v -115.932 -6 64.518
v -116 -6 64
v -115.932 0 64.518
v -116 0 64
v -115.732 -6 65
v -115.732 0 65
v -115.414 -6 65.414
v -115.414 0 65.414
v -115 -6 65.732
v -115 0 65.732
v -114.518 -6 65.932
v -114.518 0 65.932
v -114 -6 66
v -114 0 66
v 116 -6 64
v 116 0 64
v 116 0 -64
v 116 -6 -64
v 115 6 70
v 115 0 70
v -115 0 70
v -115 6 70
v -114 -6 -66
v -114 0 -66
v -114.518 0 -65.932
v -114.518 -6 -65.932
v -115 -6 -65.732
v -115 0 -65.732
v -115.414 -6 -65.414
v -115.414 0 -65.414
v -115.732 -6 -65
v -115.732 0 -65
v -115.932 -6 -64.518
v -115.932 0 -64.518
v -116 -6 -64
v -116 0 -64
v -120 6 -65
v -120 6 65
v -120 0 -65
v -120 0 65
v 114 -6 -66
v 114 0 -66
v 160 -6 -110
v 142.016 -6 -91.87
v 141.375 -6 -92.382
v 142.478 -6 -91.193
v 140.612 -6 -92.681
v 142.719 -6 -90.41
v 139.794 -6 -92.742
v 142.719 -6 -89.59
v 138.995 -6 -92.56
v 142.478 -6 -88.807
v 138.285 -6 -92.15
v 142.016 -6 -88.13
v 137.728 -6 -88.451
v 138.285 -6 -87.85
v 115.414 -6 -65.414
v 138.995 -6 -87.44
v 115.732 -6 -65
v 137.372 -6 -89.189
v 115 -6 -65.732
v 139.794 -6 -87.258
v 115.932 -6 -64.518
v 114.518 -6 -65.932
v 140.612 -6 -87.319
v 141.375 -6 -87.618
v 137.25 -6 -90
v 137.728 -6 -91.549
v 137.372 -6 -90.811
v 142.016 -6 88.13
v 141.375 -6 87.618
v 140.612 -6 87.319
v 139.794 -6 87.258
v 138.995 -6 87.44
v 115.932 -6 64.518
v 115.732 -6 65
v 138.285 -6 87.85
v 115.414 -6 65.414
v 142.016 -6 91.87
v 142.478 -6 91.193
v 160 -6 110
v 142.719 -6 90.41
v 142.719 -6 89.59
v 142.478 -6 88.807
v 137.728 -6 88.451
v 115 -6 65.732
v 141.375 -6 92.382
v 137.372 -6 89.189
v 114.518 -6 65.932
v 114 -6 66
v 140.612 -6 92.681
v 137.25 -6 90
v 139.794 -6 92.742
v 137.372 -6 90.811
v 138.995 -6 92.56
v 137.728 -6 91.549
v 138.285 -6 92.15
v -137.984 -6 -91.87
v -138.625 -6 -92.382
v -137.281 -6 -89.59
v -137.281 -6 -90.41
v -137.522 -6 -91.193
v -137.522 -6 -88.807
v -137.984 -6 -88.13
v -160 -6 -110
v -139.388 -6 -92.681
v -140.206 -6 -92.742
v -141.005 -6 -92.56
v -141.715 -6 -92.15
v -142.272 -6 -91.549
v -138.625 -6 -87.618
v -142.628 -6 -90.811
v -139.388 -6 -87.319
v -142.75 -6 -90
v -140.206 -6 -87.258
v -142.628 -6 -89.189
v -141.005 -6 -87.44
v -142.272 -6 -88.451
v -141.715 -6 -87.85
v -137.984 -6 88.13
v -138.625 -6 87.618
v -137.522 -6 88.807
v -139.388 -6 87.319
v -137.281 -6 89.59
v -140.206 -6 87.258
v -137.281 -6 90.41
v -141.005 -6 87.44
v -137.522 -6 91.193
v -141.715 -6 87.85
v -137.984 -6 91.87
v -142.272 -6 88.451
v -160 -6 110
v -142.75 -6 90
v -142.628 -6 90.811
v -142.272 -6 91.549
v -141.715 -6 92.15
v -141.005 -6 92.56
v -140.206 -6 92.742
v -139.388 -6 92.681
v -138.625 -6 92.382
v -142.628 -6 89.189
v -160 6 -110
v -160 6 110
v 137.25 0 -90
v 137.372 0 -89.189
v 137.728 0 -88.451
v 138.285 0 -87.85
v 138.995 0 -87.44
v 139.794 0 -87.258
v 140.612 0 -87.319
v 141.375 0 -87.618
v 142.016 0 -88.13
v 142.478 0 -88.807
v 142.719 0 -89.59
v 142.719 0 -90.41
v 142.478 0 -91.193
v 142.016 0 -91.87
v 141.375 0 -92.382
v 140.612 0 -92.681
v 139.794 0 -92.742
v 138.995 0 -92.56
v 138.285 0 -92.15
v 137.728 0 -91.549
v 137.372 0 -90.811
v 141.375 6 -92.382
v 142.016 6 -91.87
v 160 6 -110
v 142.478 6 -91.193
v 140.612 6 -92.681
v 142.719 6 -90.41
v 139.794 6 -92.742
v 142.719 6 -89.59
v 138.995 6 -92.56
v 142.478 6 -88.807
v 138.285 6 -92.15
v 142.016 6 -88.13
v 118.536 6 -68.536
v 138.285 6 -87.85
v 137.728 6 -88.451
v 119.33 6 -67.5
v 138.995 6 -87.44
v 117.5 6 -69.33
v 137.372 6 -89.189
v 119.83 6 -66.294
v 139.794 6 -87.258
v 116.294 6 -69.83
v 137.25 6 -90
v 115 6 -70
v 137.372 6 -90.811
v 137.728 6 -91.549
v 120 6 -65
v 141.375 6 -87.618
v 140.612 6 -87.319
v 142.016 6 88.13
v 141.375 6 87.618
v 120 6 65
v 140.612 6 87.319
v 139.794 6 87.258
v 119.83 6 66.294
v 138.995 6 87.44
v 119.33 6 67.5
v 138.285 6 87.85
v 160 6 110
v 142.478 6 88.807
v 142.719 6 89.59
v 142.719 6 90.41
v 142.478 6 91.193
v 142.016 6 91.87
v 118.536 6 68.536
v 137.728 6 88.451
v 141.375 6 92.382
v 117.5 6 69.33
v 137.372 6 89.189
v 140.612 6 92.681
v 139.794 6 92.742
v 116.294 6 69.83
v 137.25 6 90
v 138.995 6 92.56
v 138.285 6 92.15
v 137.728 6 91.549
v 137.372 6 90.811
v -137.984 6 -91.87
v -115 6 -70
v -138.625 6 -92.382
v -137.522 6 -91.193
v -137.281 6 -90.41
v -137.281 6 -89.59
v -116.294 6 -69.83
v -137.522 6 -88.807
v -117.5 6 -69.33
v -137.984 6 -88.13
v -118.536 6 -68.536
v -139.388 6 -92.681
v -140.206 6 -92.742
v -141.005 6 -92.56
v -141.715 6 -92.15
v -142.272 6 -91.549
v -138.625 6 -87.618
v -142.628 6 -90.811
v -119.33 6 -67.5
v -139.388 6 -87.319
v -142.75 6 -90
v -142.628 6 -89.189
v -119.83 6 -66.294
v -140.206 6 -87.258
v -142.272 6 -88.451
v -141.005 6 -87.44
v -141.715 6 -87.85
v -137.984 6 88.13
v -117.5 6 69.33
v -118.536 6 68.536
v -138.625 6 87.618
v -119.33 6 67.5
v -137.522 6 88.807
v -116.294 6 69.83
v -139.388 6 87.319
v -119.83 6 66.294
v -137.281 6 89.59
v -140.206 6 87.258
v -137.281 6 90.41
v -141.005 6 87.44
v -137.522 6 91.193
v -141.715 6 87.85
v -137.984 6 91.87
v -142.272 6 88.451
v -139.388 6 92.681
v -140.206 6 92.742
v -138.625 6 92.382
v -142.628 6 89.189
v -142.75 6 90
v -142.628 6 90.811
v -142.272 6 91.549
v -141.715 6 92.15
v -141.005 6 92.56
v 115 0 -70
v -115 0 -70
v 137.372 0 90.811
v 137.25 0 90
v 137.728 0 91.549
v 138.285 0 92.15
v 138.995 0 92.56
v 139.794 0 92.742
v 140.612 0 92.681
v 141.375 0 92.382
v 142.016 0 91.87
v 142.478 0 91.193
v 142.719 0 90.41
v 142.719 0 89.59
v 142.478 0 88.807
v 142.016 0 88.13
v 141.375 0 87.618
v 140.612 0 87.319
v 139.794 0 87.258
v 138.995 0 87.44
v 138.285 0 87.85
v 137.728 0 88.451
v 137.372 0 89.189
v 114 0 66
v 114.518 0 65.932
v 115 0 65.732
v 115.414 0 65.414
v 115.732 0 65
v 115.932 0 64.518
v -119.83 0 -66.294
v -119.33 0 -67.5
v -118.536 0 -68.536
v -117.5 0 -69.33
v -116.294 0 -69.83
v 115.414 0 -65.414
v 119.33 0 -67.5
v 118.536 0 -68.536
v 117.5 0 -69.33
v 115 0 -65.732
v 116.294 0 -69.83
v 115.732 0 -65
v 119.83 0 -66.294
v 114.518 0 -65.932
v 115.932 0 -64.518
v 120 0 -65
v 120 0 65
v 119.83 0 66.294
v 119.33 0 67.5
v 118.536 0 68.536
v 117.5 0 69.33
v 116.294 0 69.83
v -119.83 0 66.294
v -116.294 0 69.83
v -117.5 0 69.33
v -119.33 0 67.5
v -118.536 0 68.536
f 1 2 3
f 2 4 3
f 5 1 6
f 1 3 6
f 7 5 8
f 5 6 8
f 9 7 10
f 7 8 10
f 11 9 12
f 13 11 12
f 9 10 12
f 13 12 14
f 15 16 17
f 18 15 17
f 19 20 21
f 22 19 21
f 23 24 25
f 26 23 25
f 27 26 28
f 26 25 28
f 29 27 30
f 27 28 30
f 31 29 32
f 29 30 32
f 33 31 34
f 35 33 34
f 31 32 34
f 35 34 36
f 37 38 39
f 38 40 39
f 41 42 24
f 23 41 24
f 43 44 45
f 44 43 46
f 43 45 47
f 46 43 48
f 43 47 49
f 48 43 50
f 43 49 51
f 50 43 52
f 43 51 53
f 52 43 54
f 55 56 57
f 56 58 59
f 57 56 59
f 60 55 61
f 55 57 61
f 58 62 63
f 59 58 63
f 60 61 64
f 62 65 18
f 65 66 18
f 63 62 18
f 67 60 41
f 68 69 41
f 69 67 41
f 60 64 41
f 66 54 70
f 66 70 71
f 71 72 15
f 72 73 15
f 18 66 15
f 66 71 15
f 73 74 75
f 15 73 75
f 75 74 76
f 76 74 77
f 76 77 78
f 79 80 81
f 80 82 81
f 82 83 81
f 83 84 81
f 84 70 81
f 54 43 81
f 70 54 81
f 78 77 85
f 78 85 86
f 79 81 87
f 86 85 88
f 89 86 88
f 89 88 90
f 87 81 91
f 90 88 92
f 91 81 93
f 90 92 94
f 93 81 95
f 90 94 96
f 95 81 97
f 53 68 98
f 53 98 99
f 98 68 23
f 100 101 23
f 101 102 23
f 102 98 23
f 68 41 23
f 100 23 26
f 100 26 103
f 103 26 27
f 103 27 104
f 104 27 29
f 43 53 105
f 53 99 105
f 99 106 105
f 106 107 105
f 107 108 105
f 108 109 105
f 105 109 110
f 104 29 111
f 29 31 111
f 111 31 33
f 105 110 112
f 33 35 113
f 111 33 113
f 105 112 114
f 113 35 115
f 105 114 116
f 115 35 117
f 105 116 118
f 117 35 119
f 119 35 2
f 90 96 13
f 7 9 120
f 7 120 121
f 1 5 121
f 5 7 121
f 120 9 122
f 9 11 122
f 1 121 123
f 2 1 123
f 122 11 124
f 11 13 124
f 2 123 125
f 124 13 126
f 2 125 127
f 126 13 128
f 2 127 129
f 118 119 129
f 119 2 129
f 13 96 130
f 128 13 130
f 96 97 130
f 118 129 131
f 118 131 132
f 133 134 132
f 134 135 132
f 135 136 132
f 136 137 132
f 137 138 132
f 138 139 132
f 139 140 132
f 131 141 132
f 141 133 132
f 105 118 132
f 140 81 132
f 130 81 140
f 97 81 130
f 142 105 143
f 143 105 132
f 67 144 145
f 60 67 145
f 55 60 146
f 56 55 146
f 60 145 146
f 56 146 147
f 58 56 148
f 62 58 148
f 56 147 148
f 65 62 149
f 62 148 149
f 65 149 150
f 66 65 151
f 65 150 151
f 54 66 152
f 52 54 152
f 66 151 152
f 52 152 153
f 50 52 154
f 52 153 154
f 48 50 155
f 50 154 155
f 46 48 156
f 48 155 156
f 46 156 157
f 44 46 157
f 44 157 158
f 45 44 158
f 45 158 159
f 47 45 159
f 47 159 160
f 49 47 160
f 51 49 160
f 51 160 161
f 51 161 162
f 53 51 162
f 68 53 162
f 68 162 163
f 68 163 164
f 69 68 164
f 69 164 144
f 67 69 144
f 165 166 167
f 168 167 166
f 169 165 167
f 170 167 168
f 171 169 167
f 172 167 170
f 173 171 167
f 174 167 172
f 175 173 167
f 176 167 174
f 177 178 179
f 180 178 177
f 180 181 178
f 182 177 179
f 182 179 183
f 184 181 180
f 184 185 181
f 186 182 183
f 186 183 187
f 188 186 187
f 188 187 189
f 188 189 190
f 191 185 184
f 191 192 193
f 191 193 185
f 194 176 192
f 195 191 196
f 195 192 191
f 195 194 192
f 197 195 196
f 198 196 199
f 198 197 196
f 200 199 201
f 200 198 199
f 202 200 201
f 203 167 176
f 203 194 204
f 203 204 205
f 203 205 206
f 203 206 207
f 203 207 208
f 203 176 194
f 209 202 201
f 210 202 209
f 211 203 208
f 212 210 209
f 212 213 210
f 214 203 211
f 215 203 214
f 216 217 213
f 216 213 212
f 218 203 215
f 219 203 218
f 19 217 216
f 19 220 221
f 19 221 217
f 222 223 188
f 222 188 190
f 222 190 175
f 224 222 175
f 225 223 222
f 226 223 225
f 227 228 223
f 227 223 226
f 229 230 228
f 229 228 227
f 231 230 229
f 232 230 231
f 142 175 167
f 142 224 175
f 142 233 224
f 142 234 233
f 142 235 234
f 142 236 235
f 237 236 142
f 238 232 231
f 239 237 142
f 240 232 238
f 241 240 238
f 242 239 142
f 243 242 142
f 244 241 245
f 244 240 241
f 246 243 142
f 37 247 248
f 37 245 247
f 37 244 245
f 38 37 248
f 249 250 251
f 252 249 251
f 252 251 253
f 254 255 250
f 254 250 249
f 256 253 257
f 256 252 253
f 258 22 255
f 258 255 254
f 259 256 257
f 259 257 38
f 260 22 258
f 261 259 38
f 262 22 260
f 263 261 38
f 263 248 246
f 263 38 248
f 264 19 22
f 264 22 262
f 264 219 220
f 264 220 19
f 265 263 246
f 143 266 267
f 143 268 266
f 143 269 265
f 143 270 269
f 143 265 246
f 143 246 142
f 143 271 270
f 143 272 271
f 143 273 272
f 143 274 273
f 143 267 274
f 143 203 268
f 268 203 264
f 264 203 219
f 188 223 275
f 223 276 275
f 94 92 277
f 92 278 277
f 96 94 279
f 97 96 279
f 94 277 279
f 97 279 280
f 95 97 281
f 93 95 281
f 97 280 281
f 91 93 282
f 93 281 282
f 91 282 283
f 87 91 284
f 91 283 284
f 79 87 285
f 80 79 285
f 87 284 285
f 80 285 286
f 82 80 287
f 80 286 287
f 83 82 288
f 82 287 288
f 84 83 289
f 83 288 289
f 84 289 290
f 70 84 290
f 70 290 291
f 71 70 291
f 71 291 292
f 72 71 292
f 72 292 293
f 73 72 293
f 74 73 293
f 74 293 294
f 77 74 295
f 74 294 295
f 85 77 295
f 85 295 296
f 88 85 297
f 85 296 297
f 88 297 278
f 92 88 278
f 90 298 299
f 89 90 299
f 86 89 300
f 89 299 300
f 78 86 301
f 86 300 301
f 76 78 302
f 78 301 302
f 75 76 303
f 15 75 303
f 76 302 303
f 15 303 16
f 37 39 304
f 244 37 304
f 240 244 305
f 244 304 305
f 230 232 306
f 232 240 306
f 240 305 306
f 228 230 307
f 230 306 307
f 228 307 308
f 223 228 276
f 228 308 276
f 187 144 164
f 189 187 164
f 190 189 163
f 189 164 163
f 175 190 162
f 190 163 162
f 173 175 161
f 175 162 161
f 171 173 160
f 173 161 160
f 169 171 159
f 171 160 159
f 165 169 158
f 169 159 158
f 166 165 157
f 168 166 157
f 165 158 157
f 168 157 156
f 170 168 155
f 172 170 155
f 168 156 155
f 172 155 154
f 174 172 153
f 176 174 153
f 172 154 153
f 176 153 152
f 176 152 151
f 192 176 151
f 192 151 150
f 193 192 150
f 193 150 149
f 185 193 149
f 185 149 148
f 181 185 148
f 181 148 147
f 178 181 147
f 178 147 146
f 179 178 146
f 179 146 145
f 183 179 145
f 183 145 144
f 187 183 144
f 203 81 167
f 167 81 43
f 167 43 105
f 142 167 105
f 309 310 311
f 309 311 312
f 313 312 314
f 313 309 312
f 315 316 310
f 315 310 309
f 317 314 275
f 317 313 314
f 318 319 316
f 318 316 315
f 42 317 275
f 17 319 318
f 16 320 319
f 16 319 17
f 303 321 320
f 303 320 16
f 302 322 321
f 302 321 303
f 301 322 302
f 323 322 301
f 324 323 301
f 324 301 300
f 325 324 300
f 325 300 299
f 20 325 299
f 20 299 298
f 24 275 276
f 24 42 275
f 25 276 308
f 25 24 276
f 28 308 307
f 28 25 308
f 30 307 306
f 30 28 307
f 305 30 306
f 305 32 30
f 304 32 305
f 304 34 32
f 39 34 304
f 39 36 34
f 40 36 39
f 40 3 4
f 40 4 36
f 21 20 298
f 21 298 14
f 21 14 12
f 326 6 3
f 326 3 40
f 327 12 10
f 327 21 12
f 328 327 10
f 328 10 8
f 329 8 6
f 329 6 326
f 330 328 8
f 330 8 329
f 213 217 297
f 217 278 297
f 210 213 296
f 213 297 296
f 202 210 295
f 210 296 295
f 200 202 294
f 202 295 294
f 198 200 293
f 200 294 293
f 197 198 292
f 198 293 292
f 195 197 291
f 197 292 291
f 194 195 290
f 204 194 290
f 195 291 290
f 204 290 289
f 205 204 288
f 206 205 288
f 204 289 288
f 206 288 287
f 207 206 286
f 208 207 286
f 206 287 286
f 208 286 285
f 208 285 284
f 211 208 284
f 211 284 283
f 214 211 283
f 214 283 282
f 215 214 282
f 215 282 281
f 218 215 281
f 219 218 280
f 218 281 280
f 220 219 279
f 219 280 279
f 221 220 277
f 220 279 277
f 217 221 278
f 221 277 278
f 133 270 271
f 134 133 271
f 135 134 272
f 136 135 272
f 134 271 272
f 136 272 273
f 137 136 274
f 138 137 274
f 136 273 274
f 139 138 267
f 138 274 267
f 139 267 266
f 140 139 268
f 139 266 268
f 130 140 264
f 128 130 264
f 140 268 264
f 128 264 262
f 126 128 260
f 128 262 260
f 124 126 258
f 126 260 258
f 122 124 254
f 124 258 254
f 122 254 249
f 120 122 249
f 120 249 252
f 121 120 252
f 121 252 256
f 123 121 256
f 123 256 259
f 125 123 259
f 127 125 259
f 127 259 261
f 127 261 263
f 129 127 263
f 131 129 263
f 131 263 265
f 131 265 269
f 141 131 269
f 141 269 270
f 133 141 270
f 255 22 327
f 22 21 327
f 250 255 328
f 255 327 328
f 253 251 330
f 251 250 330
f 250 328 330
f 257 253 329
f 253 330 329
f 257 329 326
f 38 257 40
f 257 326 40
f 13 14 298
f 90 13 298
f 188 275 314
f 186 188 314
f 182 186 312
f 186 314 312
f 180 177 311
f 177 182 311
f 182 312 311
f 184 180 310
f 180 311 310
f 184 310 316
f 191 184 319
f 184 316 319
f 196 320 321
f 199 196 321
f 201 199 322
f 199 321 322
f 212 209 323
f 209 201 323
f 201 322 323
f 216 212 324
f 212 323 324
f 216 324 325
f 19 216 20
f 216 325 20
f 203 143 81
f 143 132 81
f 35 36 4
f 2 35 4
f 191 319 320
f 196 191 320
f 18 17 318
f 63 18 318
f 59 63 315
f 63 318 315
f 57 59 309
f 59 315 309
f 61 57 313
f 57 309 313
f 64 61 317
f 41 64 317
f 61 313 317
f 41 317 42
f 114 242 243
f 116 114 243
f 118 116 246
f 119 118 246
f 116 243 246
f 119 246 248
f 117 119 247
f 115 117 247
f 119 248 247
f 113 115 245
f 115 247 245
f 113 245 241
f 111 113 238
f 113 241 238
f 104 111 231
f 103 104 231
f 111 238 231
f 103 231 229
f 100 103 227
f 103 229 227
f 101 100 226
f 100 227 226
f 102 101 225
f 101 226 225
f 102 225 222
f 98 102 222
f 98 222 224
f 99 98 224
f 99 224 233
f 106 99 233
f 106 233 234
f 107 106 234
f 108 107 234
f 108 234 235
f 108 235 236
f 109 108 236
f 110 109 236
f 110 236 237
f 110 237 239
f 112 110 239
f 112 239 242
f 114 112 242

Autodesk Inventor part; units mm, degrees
ref_plane "YZ Plane" through (0, 0, 0) normal (1, 0, 0) x (0, 1, 0)
ref_plane "XZ Plane" through (0, 0, 0) normal (0, 1, 0) x (-1, 0, 0)
ref_plane "XY Plane" through (0, 0, 0) normal (0, 0, 1) x (1, 0, 0)
sketch "Skizze1" plane through (0, 0, 0) normal (0, 1, 0) x (-1, 0, 0)
  arc A0 (-116, -64) -> (-114, -66) centre (-114, -64) ccw
  arc A1 (-114, -62) -> (-112, -64) centre (-112, -62) ccw
  line L0 (-114, -62) -> (-114, 62)
  line L1 (-116, 64) -> (-116, -64)
  line L2 (-120, -65) -> (-120, 65)
  line L3 (112, -64) -> (-112, -64)
  line L4 (-114, -66) -> (114, -66)
  line L5 (115, -70) -> (-115, -70)
  line L6 (-112, 64) -> (112, 64)
  line L7 (114, 64) -> (-114, -64) construction
  line L8 (114, 66) -> (-114, 66)
  line L9 (-116, 66) -> (116, -66) construction
  line L10 (-116, -66) -> (116, 66) construction
  line L11 (-115, 70) -> (115, 70)
  line L12 (120, 70) -> (-120, -70) construction
  line L13 (120, -70) -> (-120, 70) construction
  line L14 (114, -64) -> (-114, 64) construction
  line L15 (120, 65) -> (120, -65)
  arc A2 (-120, -65) -> (-115, -70) centre (-115, -65) ccw
  arc A3 (-112, 64) -> (-114, 62) centre (-112, 62) ccw
  arc A4 (-115, 70) -> (-120, 65) centre (-115, 65) ccw
  arc A5 (-114, 66) -> (-116, 64) centre (-114, 64) ccw
  arc A6 (120, 65) -> (115, 70) centre (115, 65) ccw
  arc A7 (115, -70) -> (120, -65) centre (115, -65) ccw
  line L16 (116, -64) -> (116, 64)
  arc A8 (114, -66) -> (116, -64) centre (114, -64) ccw
  arc A9 (112, -64) -> (114, -62) centre (112, -62) ccw
  line L17 (114, 62) -> (114, -62)
  arc A10 (114, 62) -> (112, 64) centre (112, 62) ccw
  arc A11 (116, 64) -> (114, 66) centre (114, 64) ccw
  line L18 (-160, -110) -> (160, -110)
  line L19 (160, -110) -> (160, 110)
  line L20 (160, 110) -> (-160, 110)
  line L21 (-160, 110) -> (-160, -110)
  line L22 (-160, -110) -> (160, 110) construction
  line L23 (160, -110) -> (-160, 110) construction
  circle A12 centre (-140, -90) radius 2.75
  line L24 (140, 90) -> (-140, 90)
  line L25 (-140, 90) -> (-140, -90)
  line L26 (-140, -90) -> (140, -90)
  line L27 (140, -90) -> (140, 90)
  line L28 (140, 90) -> (-140, -90) construction
  line L29 (-140, 90) -> (140, -90) construction
  circle A13 centre (140, -90) radius 2.75
  circle A14 centre (140, 90) radius 2.75
  circle A15 centre (-140, 90) radius 2.75
  point P0 (0, 0)
  point P1 (0, 0)
  point P2 (0, 0)
  point P3 (0, 0)
  point P4 (0, 0)
  point P5 (0, 0)
  point P6 (0, 0)
  dimension "d0" = 140
  dimension "d1" = 240
  dimension "d2" = 5
  dimension "d3" = 232
  dimension "d4" = 132
  dimension "d5" = 2
  dimension "d6" = 128
  dimension "d7" = 228
  dimension "d8" = 2
  dimension "d19" = 40
  dimension "d20" = 40
  dimension "d21" = 5.5
  dimension "d23" = 20
  dimension "d24" = 20
extrude "Extrusion1" add sketch "Skizze1" along normal blind 6 contours L21 L20 L19 L18 | L26 L25 A12 | A12 L25 L26 | A12 L25 A15 L24 A14 L27 A13 L26 | A13 L27 L26 | L26 L27 A13 | A15 L24 L25 | L25 L24 A15 | A14 L24 L27 | L27 L24 A14
extrude "Extrusion2" add sketch "Skizze1" against normal blind 6 contours L2 A4 L11 A6 L15 A7 L5 A2 | L21 L20 L19 L18 | L26 L25 A12 | A12 L25 L26 | A12 L25 A15 L24 A14 L27 A13 L26 | A13 L27 L26 | L26 L27 A13 | A15 L24 L25 | L25 L24 A15 | A14 L24 L27 | L27 L24 A14
extrude "Extrusion3" cut sketch "Skizze1" along normal through all both and the other way through all contours L26 L25 A12 | A12 L25 L26 | A13 L27 L26 | L26 L27 A13 | A15 L24 L25 | L25 L24 A15 | A14 L24 L27 | L27 L24 A14
equation "\"d14\" = mdf_thickness"
equation "\"d16\" = mdf_thickness"
equation "\"d10\" = 6"
equation "\"kg_thickness\" = 4.9"
equation "\"ht_thickness\" = 1.9"
equation "\"case_thickness\" = 18"
equation "\"inner_thickness\" = 15"
equation "\"gap_fit\" = 0.1"
equation "\"gap_slide\" = 0.2"
equation "\"gap_air\" = 1"
equation "\"bore_diameter\" = 73"
equation "\"mdf_thickness\" = 6"
equation "\"tape_width\" = 15"
equation "\"tape_thickness\" = 3"
equation "\"inner_depth\" = 255"
properties part number "Flachfilter_Rahmen"
